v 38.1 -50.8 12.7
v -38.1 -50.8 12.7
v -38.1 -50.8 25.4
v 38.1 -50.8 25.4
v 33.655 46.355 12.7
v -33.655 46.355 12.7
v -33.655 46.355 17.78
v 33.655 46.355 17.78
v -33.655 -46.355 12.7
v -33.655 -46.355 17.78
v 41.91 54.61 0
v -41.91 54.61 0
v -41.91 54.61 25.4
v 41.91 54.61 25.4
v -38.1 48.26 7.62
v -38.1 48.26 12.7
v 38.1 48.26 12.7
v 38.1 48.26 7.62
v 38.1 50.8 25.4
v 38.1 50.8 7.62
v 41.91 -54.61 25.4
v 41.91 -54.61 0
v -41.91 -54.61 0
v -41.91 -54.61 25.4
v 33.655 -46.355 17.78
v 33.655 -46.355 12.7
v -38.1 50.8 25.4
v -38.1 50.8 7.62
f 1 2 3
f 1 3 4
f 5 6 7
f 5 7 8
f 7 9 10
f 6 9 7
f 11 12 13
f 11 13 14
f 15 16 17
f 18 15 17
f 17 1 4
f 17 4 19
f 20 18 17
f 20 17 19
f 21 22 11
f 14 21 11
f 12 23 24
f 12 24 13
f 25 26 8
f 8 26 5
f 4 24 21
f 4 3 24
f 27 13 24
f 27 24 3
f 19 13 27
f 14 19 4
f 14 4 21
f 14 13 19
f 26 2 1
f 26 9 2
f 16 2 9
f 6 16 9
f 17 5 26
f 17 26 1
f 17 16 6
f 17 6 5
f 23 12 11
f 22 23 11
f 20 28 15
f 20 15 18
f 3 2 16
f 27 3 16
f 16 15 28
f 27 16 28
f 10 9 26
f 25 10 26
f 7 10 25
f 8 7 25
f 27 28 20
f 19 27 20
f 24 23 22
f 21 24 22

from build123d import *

# Parameters (mm, degrees)
F0_W     = 76.2
F0_H     = 101.6
F1_DEPTH = 12.7
F0_W_2   = 83.82
F0_H_2   = 109.22
F2_DEPTH = 25.4
F3_W     = 67.31
F3_H     = 92.71
F4_DEPTH = 5.08
F5_W     = 76.2
F5_H     = 2.54
F6_DEPTH = 5.08


with BuildPart() as f1:
    # F0 (on Top) → F1 (new body)
    with BuildSketch(Plane.XY):
        Rectangle(F0_W, F0_H)
    extrude(amount=F1_DEPTH)

    # F0 (on Top) → F2 (join)
    with BuildSketch(Plane.XY):
        Rectangle(F0_W_2, F0_H_2)
        Rectangle(F0_W, F0_H, mode=Mode.SUBTRACT)
    extrude(amount=F2_DEPTH)

    # F3 (on face) → F4 (join)
    with BuildSketch(Plane.XY.offset(12.7)):
        Rectangle(F3_W, F3_H)
    extrude(amount=F4_DEPTH)

    # F5 (on face) → F6 (cut)
    with BuildSketch(Plane.XY.offset(12.7)):
        with Locations((0, 49.53)):
            Rectangle(F5_W, F5_H)
    extrude(amount=-F6_DEPTH, mode=Mode.SUBTRACT)


solid = f1.part
